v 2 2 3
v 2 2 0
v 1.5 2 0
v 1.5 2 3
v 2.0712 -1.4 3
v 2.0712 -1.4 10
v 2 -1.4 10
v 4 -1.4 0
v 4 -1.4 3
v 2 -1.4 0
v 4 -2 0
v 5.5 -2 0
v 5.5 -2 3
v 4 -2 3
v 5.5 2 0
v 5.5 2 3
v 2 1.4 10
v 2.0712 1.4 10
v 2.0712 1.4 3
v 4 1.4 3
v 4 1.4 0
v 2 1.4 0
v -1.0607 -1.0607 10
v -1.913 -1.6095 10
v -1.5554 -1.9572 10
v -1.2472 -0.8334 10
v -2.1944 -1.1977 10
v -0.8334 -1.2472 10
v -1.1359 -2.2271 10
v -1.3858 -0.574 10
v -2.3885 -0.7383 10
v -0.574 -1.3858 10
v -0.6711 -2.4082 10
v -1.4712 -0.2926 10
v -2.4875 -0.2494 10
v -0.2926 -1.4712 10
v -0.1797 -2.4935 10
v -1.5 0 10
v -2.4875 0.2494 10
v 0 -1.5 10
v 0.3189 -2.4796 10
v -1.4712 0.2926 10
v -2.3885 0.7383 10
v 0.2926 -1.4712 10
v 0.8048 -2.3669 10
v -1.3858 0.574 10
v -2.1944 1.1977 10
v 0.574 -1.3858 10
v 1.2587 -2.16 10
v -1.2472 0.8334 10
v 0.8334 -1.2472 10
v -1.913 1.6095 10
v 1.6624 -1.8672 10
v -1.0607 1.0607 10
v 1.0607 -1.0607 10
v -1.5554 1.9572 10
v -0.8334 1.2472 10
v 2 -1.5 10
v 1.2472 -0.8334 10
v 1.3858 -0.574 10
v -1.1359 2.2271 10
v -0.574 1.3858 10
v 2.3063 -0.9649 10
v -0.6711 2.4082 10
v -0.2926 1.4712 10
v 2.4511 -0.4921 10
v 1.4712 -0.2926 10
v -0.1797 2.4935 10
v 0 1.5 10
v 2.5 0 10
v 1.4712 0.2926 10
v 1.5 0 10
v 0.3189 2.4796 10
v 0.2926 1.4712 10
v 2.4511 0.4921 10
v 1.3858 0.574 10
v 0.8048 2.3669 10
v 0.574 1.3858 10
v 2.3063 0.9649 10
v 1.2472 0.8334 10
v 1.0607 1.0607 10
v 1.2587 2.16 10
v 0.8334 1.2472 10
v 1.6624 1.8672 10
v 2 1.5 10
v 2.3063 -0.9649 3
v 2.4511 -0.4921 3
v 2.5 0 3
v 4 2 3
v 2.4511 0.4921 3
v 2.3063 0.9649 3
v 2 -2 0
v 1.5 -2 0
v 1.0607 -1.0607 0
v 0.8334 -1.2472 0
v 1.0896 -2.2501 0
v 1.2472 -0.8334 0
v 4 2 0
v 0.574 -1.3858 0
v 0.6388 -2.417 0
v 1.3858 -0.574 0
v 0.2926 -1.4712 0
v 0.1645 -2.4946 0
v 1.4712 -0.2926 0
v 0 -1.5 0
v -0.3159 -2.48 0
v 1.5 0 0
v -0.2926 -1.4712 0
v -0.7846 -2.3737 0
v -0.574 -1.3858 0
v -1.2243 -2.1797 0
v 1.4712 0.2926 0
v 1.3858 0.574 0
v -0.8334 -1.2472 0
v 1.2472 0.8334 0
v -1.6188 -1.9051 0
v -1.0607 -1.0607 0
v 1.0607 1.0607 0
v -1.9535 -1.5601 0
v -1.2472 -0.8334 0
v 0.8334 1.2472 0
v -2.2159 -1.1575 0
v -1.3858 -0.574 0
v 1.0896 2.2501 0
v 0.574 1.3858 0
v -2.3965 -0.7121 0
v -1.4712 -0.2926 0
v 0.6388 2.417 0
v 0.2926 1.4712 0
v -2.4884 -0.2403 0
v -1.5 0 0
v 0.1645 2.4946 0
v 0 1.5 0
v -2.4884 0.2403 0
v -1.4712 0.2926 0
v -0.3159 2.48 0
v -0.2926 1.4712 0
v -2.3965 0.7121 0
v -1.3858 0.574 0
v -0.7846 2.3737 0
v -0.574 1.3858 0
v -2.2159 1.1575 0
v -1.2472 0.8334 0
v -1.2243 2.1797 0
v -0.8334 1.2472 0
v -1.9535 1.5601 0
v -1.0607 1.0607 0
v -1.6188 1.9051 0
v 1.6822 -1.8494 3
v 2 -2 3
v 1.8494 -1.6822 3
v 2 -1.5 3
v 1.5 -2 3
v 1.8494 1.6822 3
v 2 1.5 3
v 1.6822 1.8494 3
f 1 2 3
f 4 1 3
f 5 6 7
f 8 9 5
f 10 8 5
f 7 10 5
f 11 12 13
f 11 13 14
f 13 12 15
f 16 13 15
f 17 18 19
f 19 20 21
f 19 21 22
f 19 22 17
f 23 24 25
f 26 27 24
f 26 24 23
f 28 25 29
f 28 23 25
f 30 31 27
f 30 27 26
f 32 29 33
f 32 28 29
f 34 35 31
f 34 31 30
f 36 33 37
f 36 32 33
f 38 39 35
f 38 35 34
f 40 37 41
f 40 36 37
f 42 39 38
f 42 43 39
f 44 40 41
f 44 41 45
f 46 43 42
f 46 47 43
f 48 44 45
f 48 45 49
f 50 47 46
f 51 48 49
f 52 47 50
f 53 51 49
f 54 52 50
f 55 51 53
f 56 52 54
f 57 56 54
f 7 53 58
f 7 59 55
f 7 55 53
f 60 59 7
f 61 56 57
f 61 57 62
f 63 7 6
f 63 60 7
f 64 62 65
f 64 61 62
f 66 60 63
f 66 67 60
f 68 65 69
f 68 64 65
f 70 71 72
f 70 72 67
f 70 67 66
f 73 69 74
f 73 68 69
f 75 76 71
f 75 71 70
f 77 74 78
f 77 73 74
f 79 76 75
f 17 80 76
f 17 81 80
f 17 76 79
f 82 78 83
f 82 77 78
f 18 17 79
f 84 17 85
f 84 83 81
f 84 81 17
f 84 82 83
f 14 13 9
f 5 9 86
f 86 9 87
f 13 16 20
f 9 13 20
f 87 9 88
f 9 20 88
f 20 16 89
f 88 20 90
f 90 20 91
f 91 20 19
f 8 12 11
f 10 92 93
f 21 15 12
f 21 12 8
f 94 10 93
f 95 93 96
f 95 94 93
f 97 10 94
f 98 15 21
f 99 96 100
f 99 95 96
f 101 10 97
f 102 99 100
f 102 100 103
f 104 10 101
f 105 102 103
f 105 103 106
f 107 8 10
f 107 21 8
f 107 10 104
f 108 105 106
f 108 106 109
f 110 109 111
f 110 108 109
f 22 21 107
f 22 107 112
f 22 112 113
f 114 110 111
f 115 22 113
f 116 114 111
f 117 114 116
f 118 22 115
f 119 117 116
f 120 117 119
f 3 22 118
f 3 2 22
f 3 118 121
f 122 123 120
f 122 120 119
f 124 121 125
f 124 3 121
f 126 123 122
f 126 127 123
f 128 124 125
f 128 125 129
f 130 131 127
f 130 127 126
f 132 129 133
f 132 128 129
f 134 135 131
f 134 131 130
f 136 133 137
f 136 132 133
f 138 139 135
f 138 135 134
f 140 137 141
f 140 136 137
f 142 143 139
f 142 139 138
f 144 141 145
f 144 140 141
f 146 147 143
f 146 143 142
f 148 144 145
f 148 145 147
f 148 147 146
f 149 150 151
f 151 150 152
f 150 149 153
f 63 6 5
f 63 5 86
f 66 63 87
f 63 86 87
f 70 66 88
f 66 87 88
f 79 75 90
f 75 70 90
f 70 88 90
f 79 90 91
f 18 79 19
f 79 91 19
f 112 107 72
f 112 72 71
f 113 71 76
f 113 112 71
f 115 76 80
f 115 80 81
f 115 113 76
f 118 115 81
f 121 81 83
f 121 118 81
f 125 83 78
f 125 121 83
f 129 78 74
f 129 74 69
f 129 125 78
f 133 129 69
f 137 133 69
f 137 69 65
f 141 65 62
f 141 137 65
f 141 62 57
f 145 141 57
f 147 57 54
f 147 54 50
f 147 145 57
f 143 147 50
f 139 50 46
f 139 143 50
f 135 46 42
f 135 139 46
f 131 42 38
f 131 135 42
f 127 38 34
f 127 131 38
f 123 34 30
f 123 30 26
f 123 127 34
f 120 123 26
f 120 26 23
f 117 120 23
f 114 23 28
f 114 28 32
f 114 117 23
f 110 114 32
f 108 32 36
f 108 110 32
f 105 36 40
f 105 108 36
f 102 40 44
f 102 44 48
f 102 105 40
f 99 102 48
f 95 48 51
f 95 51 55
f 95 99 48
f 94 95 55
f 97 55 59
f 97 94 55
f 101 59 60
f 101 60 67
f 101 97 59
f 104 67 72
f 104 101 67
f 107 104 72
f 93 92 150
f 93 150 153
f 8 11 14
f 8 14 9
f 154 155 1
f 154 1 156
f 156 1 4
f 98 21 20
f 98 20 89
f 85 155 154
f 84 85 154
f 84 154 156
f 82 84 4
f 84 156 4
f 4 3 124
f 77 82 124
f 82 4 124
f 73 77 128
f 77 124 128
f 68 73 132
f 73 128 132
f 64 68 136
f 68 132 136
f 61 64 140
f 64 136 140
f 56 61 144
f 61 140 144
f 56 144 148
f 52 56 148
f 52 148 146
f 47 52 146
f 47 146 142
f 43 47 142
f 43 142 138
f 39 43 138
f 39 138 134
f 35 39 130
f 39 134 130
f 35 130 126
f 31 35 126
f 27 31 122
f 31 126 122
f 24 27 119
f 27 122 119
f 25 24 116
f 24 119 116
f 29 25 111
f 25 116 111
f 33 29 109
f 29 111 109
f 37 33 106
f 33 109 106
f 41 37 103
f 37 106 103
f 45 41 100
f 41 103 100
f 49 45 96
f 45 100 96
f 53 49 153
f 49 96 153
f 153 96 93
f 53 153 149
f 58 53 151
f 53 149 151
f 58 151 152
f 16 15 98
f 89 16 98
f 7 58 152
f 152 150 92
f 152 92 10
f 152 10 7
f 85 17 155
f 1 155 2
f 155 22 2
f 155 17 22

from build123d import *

# Parameters (mm, degrees)
SKETCH_1_R          = 2.5
SKETCH_1_R_2        = 1.5
EXTRUDE_1_DEPTH     = 10
SKETCH_2_W          = 4
SKETCH_2_H          = 4
EXTRUDE_2_DEPTH     = 3
SKETCH_3_W          = 2
SKETCH_3_H          = 0.6
CUT_EXTRUDE_1_DEPTH = 12.683321446


with BuildPart() as part:
    # 草图1 → 凸台-拉伸1 (new body)
    with BuildSketch(Plane.XY):
        Circle(SKETCH_1_R)
        Circle(SKETCH_1_R_2, mode=Mode.SUBTRACT)
    extrude(amount=EXTRUDE_1_DEPTH)

    # 草图2 → 凸台-拉伸2 (add)
    with BuildSketch(Plane(origin=(0, 0, 0), x_dir=(-1, 0, 0), z_dir=(0, 0, -1))):
        with Locations((-3.5, 0)):
            Rectangle(SKETCH_2_W, SKETCH_2_H)
    extrude(amount=-EXTRUDE_2_DEPTH)

    # 草图3 → 切除-拉伸1 (cut, through all)
    with BuildSketch(Plane(origin=(0, 0, 0), x_dir=(-1, 0, 0), z_dir=(0, 0, -1))):
        with Locations((-3, -1.7)):
            Rectangle(SKETCH_3_W, SKETCH_3_H)
        with Locations((-3, 1.7)):
            Rectangle(SKETCH_3_W, SKETCH_3_H)
    extrude(amount=-CUT_EXTRUDE_1_DEPTH, mode=Mode.SUBTRACT)


solid = part.part
